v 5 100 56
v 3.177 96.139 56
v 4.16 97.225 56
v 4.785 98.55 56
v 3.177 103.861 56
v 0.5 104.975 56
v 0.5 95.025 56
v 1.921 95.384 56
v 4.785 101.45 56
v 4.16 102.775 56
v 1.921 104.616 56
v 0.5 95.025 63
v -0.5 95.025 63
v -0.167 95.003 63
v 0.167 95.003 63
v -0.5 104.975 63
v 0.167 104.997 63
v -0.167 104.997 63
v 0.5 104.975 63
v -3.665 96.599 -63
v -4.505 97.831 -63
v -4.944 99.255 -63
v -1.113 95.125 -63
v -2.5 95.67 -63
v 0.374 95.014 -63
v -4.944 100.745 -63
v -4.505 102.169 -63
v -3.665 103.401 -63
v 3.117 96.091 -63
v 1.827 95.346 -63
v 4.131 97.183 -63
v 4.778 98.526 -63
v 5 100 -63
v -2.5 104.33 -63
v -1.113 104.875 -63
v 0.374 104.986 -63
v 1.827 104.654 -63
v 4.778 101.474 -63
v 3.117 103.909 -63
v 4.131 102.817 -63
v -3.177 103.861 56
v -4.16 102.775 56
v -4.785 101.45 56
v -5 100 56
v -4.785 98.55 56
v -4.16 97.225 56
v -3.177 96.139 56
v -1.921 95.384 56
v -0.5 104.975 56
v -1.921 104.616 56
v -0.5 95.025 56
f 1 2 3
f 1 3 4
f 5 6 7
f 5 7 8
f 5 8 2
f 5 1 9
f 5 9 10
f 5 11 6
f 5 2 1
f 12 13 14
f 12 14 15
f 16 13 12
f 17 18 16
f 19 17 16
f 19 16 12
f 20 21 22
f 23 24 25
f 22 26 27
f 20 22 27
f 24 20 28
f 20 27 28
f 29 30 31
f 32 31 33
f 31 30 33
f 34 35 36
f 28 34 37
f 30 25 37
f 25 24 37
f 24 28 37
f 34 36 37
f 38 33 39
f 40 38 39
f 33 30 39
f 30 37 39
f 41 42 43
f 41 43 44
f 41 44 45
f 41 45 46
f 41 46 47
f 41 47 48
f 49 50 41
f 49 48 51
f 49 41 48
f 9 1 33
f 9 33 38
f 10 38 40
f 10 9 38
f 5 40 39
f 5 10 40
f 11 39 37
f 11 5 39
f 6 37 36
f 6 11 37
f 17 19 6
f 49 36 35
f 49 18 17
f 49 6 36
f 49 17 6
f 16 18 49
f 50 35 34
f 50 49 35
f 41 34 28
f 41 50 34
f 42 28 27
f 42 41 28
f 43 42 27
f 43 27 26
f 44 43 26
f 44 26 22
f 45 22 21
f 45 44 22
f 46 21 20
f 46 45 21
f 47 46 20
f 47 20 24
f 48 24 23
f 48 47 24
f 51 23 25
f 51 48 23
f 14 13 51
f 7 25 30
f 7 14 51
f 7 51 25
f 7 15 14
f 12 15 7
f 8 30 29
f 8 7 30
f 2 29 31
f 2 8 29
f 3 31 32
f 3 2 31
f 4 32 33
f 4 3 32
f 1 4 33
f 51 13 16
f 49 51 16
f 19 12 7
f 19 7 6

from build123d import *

# Parameters (mm, degrees)
ESBO_O1_R                = 5
RESSALTO_EXTRUS_O1_DEPTH = 63
SKETCH1_W                = 5
SKETCH1_H                = 14
CUT_EXTRUDE1_DEPTH       = 7


with BuildPart() as part:
    # Esboço1 → Ressalto-extrusão1 (new, symmetric)
    with BuildSketch(Plane.XY):
        with Locations((0, 100)):
            Circle(ESBO_O1_R)
    extrude(amount=RESSALTO_EXTRUS_O1_DEPTH, both=True)

    # Sketch1 → Cut-Extrude1 (cut)
    with BuildSketch(Plane.XY.offset(63)):
        with Locations((3, 100)):
            Rectangle(SKETCH1_W, SKETCH1_H)
        with Locations((-3, 100)):
            Rectangle(SKETCH1_W, SKETCH1_H)
    extrude(amount=-CUT_EXTRUDE1_DEPTH, mode=Mode.SUBTRACT)


solid = part.part
